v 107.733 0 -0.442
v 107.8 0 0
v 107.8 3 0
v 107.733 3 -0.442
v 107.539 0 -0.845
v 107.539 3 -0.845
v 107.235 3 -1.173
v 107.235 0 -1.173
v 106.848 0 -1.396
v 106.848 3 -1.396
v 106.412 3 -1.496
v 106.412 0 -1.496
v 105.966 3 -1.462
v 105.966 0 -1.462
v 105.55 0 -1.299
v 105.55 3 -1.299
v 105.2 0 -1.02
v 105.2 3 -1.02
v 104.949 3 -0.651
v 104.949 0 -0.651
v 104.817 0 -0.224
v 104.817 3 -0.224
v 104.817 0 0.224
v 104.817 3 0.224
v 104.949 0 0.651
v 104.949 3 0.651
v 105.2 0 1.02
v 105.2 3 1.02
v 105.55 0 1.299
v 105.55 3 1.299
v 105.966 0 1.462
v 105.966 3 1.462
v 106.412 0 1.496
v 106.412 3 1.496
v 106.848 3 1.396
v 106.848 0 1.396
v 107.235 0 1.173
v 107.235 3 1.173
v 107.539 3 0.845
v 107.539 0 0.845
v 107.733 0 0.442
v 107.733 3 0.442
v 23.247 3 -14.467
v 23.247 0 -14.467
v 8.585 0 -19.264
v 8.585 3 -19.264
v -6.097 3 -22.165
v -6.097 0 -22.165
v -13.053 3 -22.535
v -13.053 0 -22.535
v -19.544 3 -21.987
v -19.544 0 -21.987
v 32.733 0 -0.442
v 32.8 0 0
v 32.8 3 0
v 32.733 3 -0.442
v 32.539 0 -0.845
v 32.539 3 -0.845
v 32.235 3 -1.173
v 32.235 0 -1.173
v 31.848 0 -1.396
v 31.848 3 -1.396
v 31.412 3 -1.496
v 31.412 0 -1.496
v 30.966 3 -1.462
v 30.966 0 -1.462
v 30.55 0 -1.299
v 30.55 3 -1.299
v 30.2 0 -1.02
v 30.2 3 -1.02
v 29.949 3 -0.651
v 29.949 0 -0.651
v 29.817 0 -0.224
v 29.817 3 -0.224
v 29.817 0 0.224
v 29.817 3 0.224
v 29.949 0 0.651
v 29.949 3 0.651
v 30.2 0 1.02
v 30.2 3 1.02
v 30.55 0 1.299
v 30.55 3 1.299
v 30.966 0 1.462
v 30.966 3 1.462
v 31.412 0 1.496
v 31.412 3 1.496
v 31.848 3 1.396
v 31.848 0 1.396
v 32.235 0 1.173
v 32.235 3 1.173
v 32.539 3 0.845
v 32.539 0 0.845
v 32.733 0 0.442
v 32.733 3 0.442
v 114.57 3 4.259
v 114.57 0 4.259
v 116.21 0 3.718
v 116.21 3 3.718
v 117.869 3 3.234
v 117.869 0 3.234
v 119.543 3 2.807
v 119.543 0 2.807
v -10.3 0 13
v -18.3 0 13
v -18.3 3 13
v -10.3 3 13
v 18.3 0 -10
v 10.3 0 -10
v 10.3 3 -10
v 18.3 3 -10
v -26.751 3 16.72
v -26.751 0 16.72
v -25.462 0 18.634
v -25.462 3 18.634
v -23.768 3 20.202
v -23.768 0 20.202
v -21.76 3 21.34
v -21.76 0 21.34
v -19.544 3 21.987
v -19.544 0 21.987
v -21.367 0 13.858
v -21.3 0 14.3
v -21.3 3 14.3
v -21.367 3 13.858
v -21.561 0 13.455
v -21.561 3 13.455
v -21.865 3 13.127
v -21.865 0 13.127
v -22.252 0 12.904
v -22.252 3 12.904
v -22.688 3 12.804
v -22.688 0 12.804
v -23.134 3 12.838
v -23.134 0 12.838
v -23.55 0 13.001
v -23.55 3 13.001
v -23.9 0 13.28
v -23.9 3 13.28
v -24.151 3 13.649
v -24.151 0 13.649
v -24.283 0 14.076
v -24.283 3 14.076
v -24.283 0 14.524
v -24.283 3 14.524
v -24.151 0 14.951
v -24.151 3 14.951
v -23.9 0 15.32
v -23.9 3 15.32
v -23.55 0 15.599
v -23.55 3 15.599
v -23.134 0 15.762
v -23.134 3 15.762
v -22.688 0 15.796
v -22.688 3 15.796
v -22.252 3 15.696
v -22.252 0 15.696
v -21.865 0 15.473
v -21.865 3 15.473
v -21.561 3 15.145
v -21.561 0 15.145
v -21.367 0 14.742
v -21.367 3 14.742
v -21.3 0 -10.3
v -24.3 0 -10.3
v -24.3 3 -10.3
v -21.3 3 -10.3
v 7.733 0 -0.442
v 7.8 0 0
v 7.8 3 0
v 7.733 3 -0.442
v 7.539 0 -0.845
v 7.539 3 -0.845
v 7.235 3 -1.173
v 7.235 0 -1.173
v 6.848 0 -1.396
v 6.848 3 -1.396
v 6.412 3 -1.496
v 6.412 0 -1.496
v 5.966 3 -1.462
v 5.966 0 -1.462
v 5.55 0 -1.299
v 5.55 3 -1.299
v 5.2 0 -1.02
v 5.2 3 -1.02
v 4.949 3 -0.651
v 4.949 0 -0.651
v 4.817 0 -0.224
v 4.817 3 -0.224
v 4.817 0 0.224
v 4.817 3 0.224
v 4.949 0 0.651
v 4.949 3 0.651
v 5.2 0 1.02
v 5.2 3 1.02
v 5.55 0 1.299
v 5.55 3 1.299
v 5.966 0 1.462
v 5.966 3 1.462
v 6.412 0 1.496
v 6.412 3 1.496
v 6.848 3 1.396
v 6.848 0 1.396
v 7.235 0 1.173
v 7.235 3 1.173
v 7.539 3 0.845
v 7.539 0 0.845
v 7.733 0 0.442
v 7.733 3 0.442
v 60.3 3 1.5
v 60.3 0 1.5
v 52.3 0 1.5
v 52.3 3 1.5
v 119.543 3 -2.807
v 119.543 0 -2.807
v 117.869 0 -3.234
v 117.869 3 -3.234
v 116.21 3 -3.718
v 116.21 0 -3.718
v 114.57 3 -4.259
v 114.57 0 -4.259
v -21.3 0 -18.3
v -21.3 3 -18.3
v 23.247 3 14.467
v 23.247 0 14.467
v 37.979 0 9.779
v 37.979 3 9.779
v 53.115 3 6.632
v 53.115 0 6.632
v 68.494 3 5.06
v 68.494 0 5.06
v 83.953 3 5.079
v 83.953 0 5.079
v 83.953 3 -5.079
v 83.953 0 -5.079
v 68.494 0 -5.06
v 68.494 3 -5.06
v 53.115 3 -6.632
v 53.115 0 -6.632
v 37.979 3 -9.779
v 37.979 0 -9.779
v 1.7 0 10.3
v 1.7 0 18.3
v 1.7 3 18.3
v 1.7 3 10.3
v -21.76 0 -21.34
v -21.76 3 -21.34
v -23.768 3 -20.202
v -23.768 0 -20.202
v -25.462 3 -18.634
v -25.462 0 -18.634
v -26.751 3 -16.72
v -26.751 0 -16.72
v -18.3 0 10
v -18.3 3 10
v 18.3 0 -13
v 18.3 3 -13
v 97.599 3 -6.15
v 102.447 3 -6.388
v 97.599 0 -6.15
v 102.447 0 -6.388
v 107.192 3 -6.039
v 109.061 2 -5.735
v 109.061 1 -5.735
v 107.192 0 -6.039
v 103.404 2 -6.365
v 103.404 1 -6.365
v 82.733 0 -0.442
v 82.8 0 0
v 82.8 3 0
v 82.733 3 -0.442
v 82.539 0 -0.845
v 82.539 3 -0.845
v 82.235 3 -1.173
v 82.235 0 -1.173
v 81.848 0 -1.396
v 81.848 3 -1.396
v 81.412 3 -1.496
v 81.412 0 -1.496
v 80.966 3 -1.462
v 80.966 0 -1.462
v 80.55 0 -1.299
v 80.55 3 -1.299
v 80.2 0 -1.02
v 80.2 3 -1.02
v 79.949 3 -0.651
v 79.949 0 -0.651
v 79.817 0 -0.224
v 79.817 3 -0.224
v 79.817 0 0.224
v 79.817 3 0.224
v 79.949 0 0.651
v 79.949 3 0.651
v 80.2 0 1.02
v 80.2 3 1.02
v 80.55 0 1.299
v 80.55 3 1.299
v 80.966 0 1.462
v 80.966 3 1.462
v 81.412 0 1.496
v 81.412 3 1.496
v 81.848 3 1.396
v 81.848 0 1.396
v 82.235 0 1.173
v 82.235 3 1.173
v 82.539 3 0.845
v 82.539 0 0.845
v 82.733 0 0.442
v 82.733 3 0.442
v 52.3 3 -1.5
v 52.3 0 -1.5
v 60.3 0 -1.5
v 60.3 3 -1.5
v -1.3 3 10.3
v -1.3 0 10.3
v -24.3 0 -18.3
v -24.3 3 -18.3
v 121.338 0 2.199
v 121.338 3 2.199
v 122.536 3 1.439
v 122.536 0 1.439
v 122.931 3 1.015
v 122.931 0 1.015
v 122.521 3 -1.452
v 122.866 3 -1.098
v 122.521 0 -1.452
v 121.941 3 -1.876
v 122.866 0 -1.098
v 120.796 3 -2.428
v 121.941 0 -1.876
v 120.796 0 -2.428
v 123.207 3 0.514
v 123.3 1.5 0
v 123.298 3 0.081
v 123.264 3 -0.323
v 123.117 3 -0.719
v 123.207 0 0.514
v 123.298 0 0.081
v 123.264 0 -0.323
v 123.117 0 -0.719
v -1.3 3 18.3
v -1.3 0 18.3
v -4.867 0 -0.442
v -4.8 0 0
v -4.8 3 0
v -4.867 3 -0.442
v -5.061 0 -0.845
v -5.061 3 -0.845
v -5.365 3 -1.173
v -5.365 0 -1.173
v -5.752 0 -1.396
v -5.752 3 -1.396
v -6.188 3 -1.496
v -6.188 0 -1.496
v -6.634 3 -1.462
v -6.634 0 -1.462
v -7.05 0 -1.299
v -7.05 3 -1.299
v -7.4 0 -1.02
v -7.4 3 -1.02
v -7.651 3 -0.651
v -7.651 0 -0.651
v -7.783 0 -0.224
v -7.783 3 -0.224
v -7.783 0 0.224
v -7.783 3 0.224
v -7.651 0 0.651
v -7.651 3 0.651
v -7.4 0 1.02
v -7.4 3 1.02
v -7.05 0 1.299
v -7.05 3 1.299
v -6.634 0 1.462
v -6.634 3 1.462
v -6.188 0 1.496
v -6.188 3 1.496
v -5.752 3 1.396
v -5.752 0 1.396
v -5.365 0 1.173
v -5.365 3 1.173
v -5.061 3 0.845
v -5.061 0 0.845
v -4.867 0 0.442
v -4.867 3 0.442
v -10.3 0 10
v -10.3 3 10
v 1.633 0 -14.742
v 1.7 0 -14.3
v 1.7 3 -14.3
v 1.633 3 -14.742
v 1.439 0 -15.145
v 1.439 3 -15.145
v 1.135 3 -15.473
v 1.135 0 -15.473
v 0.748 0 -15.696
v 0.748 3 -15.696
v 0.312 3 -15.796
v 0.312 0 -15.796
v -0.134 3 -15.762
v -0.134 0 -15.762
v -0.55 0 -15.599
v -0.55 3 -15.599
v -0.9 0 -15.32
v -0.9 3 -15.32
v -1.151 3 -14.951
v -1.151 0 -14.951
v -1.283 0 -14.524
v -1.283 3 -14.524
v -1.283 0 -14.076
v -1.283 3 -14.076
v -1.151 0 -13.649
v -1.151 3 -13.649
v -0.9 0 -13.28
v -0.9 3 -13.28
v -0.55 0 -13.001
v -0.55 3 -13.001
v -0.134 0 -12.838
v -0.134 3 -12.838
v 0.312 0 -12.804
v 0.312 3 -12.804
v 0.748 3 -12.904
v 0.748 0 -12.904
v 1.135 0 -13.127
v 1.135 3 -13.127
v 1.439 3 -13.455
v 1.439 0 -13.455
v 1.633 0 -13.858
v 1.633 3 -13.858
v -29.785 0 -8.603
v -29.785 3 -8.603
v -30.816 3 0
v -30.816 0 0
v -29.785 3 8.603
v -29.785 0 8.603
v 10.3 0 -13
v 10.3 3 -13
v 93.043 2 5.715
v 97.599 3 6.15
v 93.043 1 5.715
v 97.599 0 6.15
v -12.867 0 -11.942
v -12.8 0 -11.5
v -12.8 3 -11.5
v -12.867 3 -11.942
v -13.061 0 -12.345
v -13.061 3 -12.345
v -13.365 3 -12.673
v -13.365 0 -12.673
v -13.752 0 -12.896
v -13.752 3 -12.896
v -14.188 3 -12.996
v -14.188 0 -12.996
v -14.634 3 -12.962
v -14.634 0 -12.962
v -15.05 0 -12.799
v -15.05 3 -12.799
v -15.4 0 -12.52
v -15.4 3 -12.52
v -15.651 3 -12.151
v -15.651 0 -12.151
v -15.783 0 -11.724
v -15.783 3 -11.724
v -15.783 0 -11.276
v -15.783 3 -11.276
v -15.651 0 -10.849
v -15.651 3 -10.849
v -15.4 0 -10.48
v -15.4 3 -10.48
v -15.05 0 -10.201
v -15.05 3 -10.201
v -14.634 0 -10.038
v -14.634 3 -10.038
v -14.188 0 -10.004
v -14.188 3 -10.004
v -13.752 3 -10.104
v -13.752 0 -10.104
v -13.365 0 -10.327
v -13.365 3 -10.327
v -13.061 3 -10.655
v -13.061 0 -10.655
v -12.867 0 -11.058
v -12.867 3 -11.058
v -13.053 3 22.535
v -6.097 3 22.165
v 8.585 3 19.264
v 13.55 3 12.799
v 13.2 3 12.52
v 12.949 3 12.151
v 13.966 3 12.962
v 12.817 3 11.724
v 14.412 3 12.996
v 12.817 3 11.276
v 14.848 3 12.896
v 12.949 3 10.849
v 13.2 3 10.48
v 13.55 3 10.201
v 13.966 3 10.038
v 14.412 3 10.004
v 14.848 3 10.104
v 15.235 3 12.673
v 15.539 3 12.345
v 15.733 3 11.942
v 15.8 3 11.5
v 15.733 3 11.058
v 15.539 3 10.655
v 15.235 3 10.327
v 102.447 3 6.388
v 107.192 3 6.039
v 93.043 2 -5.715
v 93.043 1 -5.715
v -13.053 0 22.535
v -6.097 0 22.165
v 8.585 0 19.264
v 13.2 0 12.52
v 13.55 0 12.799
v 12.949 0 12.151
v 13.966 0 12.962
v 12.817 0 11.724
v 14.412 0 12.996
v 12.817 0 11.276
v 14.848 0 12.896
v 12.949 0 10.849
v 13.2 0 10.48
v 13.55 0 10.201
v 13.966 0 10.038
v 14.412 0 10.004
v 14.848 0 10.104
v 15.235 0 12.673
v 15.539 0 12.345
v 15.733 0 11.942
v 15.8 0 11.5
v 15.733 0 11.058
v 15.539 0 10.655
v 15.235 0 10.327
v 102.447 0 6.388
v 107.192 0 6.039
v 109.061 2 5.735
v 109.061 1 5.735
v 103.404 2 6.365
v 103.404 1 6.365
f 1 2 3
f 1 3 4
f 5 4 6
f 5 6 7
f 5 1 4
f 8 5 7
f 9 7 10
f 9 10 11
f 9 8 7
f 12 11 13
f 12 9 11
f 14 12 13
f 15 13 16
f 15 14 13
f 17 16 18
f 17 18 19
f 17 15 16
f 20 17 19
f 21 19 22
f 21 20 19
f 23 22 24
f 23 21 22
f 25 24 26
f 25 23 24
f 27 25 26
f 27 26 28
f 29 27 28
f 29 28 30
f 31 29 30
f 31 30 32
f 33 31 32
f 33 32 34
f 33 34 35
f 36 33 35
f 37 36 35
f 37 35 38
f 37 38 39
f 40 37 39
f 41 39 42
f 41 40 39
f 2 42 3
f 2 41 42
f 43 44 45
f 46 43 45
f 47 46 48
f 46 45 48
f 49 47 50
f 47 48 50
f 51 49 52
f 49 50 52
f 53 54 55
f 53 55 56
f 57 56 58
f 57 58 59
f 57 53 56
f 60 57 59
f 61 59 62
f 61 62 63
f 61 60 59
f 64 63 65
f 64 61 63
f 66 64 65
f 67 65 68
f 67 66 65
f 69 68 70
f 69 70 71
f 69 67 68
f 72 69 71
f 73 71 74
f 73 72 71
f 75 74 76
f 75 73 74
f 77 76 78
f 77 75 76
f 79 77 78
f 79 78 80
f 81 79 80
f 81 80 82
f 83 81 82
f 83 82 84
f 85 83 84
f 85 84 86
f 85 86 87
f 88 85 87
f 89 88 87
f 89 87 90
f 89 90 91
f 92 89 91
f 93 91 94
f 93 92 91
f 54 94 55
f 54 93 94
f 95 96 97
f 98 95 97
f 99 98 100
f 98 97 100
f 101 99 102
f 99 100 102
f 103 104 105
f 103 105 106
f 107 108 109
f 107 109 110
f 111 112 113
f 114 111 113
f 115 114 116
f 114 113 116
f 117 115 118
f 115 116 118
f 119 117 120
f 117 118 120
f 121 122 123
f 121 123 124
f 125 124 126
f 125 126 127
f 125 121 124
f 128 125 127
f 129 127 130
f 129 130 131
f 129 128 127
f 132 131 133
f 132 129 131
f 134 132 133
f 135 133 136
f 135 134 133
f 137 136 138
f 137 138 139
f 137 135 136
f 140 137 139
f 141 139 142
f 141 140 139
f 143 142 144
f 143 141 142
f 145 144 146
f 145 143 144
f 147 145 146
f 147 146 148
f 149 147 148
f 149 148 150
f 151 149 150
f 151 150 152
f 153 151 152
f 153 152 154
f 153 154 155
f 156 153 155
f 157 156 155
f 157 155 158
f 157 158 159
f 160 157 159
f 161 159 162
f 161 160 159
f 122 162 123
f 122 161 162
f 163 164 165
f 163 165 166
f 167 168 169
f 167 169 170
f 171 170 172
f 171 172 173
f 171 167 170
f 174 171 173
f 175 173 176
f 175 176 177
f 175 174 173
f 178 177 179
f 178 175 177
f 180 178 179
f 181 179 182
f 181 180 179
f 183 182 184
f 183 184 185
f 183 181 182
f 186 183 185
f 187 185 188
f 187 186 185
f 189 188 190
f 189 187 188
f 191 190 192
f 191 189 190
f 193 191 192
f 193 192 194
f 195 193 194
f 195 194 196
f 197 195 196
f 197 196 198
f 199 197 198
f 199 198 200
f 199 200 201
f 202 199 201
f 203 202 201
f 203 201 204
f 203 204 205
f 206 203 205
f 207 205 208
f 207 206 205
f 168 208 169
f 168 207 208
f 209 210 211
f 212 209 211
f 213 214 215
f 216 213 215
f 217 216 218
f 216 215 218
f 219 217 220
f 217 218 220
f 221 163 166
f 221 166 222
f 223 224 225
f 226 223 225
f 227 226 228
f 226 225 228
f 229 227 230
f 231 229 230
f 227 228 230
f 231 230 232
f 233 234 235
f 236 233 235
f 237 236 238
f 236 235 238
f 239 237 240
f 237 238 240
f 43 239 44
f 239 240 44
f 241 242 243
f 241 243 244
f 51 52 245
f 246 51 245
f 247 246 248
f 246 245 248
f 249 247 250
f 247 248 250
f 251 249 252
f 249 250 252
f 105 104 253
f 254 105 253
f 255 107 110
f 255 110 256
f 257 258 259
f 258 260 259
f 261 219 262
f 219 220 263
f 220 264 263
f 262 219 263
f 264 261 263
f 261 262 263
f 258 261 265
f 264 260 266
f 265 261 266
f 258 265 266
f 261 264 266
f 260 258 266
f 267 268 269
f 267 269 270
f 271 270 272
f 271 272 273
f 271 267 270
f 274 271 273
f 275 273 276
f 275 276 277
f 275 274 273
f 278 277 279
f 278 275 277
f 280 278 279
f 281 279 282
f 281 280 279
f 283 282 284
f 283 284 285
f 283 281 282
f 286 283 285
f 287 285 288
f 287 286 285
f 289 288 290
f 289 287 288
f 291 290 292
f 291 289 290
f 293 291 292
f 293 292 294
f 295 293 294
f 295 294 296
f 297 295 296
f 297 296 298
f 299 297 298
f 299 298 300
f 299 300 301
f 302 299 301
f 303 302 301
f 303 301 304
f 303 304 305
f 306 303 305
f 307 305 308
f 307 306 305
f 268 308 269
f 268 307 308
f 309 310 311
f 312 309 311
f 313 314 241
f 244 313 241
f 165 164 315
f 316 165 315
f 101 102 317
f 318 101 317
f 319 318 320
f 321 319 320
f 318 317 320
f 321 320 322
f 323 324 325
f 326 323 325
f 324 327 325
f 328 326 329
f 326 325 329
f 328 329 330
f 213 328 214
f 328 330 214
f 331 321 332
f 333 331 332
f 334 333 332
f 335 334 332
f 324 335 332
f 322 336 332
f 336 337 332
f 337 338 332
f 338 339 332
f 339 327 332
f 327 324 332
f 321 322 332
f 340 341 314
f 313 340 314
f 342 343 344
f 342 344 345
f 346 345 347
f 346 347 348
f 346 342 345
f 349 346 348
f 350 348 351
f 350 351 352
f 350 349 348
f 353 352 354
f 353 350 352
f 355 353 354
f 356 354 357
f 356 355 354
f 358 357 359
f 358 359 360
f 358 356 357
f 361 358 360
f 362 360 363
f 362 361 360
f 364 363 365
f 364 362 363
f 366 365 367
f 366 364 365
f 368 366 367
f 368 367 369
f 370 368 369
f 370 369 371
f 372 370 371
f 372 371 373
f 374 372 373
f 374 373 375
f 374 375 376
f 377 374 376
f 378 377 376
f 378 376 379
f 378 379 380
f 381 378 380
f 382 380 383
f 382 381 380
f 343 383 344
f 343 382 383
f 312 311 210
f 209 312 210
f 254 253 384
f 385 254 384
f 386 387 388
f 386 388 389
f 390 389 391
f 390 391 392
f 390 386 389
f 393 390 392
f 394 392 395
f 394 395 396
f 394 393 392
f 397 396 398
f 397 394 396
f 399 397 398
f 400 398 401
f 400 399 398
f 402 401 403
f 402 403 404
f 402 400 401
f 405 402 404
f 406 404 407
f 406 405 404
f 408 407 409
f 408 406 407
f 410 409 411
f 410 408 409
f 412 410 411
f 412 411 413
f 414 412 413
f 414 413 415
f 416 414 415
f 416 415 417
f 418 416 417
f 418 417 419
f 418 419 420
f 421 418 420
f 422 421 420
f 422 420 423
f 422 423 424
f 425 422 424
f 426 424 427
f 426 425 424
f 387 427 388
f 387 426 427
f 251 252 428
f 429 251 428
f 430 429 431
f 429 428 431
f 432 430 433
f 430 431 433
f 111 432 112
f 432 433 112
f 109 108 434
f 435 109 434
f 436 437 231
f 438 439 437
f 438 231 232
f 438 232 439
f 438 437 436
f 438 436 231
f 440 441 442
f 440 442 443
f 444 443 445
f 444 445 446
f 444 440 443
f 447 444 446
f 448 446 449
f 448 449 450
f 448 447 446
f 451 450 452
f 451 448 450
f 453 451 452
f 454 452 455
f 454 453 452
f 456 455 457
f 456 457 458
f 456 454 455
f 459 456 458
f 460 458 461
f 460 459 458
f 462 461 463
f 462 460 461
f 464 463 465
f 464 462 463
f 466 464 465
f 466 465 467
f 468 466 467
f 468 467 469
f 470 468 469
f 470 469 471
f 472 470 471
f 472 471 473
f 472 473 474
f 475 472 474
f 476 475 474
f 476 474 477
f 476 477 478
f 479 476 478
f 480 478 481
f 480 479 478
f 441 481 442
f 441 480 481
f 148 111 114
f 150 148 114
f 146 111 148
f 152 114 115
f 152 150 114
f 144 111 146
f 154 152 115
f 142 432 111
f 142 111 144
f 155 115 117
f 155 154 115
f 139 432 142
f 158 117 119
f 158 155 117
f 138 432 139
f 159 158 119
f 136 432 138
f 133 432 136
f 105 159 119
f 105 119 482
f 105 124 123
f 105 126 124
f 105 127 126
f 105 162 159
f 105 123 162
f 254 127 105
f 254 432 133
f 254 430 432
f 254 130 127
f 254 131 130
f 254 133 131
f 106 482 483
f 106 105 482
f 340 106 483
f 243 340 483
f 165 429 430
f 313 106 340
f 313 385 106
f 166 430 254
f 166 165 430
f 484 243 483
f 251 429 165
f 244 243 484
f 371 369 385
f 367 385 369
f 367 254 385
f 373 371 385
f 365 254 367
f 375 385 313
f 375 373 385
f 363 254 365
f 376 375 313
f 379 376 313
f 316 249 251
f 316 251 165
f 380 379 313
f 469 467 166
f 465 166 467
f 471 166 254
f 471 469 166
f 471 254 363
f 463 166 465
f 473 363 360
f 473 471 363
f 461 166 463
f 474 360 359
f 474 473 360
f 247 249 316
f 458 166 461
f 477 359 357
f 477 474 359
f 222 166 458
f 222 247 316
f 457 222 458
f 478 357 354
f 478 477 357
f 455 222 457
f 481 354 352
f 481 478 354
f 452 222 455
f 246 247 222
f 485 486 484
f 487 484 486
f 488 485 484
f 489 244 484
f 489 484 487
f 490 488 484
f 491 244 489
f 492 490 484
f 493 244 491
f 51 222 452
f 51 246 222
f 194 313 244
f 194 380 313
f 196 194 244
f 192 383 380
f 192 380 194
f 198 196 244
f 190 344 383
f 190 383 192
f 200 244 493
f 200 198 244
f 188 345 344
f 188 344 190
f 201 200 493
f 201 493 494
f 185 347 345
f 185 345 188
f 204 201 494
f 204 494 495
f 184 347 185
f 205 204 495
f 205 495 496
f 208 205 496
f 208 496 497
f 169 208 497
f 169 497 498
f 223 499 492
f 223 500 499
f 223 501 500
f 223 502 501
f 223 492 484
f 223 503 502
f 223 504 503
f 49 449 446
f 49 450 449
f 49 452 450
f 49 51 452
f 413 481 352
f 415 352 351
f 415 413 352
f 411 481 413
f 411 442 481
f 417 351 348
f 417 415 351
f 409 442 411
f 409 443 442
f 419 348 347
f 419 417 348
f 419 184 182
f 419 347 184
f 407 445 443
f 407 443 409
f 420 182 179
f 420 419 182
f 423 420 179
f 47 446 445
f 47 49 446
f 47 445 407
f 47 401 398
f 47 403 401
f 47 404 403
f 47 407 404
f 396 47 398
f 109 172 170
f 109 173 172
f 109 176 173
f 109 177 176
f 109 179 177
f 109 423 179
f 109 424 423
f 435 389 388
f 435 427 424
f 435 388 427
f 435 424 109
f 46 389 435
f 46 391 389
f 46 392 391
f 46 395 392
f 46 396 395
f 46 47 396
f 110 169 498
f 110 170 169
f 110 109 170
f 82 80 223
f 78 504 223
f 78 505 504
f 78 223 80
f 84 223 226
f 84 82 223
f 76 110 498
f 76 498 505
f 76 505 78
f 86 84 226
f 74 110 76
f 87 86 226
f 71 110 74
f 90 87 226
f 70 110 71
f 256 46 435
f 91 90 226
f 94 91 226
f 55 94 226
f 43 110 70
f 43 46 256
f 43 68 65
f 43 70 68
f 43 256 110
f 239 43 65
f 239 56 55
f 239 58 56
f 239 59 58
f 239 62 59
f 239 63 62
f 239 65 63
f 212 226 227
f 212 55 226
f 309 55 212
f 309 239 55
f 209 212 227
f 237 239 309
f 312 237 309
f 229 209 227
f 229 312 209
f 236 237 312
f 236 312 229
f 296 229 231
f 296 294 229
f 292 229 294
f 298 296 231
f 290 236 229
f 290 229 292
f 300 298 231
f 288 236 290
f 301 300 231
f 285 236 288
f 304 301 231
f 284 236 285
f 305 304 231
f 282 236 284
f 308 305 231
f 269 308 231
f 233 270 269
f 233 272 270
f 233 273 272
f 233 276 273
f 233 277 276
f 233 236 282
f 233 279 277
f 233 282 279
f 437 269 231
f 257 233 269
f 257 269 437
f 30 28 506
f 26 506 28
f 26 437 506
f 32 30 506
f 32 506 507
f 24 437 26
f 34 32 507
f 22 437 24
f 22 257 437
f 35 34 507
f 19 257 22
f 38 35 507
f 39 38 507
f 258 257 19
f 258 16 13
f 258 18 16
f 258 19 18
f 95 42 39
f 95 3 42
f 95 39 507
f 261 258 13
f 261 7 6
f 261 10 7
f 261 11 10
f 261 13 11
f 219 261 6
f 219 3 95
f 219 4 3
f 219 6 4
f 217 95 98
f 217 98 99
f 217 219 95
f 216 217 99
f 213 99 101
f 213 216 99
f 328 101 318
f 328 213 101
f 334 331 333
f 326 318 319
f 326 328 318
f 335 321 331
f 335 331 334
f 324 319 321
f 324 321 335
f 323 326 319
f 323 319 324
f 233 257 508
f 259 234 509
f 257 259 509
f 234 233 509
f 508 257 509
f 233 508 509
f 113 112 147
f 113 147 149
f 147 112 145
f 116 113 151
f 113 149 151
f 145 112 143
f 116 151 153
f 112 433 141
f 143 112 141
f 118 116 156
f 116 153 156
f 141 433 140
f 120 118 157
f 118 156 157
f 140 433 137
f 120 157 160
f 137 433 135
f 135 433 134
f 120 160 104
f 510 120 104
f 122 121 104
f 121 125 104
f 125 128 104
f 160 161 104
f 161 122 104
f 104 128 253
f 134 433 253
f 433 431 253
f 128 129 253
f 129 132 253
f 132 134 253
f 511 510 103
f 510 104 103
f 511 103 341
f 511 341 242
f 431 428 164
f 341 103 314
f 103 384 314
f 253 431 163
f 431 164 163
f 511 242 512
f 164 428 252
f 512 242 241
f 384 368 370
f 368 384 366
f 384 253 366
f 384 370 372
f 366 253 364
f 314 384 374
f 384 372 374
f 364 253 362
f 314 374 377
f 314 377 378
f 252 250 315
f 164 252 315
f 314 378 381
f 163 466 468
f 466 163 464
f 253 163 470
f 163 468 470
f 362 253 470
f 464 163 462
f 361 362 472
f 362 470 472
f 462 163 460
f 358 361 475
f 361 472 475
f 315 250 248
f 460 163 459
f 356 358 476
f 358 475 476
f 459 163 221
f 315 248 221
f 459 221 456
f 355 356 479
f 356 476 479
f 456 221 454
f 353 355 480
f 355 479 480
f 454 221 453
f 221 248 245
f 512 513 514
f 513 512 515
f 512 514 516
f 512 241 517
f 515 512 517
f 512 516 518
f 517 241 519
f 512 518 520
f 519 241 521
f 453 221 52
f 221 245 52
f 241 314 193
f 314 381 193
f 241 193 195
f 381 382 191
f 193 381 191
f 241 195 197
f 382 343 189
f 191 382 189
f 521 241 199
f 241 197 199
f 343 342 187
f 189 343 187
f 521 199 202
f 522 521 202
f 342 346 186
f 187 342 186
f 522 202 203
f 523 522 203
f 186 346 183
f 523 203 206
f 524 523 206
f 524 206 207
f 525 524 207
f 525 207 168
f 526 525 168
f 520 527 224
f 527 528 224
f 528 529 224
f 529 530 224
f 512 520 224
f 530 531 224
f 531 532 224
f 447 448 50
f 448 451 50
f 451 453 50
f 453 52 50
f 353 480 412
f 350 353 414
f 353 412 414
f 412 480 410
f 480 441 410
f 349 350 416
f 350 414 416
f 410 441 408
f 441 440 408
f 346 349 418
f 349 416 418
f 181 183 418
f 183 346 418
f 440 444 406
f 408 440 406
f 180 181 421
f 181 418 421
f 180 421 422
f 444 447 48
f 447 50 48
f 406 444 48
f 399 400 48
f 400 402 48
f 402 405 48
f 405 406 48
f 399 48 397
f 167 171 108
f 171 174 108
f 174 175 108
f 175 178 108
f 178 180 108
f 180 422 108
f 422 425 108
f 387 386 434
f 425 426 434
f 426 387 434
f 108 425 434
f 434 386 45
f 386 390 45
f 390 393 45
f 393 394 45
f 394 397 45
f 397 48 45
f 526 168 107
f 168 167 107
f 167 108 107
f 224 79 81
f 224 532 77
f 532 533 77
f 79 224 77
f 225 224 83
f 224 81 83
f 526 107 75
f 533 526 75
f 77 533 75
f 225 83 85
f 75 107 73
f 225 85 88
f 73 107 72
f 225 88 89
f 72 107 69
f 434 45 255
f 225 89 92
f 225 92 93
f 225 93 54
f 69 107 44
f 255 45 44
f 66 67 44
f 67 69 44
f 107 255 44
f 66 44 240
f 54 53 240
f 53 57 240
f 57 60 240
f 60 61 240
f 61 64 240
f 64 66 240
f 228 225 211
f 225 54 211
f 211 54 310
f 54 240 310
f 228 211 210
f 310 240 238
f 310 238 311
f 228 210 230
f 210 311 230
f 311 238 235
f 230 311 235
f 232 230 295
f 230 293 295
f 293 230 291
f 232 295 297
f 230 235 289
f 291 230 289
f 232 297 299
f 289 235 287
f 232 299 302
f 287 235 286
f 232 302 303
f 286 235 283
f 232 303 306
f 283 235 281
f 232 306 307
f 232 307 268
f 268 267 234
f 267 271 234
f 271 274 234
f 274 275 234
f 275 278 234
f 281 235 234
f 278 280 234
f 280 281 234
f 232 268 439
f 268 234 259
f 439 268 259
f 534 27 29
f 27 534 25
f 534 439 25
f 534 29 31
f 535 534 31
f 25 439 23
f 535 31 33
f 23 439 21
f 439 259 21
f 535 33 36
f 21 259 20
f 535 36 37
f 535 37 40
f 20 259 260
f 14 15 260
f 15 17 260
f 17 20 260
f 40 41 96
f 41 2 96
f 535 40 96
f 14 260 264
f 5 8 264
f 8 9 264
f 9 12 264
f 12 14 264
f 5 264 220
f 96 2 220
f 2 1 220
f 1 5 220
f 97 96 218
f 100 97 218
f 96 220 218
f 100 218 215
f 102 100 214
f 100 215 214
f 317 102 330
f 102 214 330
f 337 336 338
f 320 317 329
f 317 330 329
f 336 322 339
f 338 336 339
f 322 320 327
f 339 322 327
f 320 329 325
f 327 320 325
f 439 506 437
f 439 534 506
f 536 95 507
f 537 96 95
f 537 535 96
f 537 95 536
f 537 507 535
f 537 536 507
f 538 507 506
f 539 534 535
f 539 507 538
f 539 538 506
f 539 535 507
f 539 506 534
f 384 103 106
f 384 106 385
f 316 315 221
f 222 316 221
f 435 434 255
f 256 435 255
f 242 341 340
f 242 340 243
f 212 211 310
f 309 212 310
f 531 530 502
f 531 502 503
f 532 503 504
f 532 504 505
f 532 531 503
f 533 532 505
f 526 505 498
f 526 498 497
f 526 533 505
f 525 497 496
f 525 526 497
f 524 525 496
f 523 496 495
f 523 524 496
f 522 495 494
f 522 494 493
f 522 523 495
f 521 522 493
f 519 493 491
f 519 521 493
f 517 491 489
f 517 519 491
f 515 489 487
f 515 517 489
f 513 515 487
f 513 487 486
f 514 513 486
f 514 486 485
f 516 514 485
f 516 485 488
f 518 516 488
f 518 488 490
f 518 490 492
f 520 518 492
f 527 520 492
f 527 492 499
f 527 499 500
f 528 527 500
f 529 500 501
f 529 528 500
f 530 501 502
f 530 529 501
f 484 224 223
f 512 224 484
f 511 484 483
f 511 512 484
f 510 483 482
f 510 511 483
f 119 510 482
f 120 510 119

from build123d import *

# Parameters (mm, degrees)
ESBO_O1_R                = 1.5
ESBO_O1_W                = 3
ESBO_O1_H                = 8
ESBO_O1_W_2              = 8
ESBO_O1_H_2              = 3
RESSALTO_EXTRUS_O1_DEPTH = 3


with BuildPart() as part:
    # Esboço1 → Ressalto-extrusão1 (new body)
    with BuildSketch(Plane(origin=(0, 0, 0), x_dir=(1, 0, 0), z_dir=(0, 1, 0))):
        with BuildLine():
            ThreePointArc((-19.544028008, 21.987058404), (-23.767751262, 20.202130438), (-26.75078073, 16.719697214))
            ThreePointArc((-26.75078073, 16.719697214), (-30.815641586, -2.3e-07), (-26.750780519, -16.719697622))
            ThreePointArc((-26.750780519, -16.719697622), (-23.767751269, -20.202130616), (-19.544028371, -21.987058612))
            add(Edge.make_bspline(
                [(23.247280819, -14.466941833), (22.21541658, -14.85491506), (7.843575487, -20.128766531), (-8.032505645, -23.945383183), (-19.544028371, -21.987058612)],
                knots=[0.1894974, 0.1894974, 0.1894974, 0.1894974, 0.216439611, 0.561126756, 0.561126756, 0.561126756, 0.561126756], degree=3))
            ThreePointArc((23.247280819, -14.466941833), (53.114593998, -6.632399806), (83.953283265, -5.079438247))
            add(Edge.make_bspline(
                [(97.598521861, -6.15), (93.039003458, -5.676054912), (88.490590593, -5.319200994), (83.953283265, -5.079438247)],
                knots=[0, 0, 0, 0, 0.137959586, 0.137959586, 0.137959586, 0.137959586], degree=3))
            add(Edge.make_bspline(
                [(114.569723425, -4.259468977), (109.134912936, -6.157348784), (103.477845748, -6.787525792), (97.598521861, -6.15)],
                knots=[0.35388944, 0.35388944, 0.35388944, 0.35388944, 1, 1, 1, 1], degree=3))
            ThreePointArc((114.569723425, -4.259468977), (117.037611185, -3.468795912), (119.543150354, -2.807050219))
            add(Edge.make_bspline(
                [(119.543150354, -2.807050219), (131.408766059, 0), (119.543150354, 2.807050219)],
                knots=[5.194112445, 5.194112445, 5.194112445, 7.372258169, 7.372258169, 7.372258169], degree=2, weights=[1, 0.463307193, 1]))
            ThreePointArc((119.543150354, 2.807050219), (117.037611185, 3.468795912), (114.569723425, 4.259468977))
            add(Edge.make_bspline(
                [(114.569723425, 4.259468977), (109.134912936, 6.157348784), (103.477845748, 6.787525792), (97.598521861, 6.15)],
                knots=[0.35388944, 0.35388944, 0.35388944, 0.35388944, 1, 1, 1, 1], degree=3))
            add(Edge.make_bspline(
                [(97.598521861, 6.15), (93.039003574, 5.676054924), (88.490590825, 5.319201013), (83.953283612, 5.079438265)],
                knots=[0, 0, 0, 0, 0.137959582, 0.137959582, 0.137959582, 0.137959582], degree=3))
            ThreePointArc((83.953283612, 5.079438265), (53.114594943, 6.632399691), (23.24728229, 14.466941345))
            add(Edge.make_bspline(
                [(23.24728229, 14.466941345), (22.21541757, 14.854914742), (7.843576153, 20.128766099), (-8.032505406, 23.945382333), (-19.544028008, 21.987058404)],
                knots=[0.189497388, 0.189497388, 0.189497388, 0.189497388, 0.216439611, 0.561126752, 0.561126752, 0.561126752, 0.561126752], degree=3))
        make_face()
        with Locations((-22.8, -14.3)):
            Circle(ESBO_O1_R, mode=Mode.SUBTRACT)
        with Locations((0.2, -14.3)):
            Rectangle(ESBO_O1_W, ESBO_O1_H, mode=Mode.SUBTRACT)
        with Locations((-14.3, -11.5)):
            Rectangle(ESBO_O1_W_2, ESBO_O1_H_2, mode=Mode.SUBTRACT)
        with Locations((14.3, -11.5)):
            Circle(ESBO_O1_R, mode=Mode.SUBTRACT)
        with Locations((-6.3, 0)):
            Circle(ESBO_O1_R, mode=Mode.SUBTRACT)
        with Locations((6.3, 0)):
            Circle(ESBO_O1_R, mode=Mode.SUBTRACT)
        with Locations((-14.3, 11.5)):
            Circle(ESBO_O1_R, mode=Mode.SUBTRACT)
        with Locations((31.3, 0)):
            Circle(ESBO_O1_R, mode=Mode.SUBTRACT)
        with Locations((14.3, 11.500000009)):
            Rectangle(ESBO_O1_W_2, ESBO_O1_H_2, mode=Mode.SUBTRACT)
        with Locations((-22.8, 14.3)):
            Rectangle(ESBO_O1_W, ESBO_O1_H, mode=Mode.SUBTRACT)
        with Locations((0.2, 14.3)):
            Circle(ESBO_O1_R, mode=Mode.SUBTRACT)
        Polygon((60.3, -1.5), (56.3, -1.5), (52.3, -1.5), (52.3, 1.5), (60.3, 1.5), align=None, mode=Mode.SUBTRACT)
        with Locations((81.3, 0)):
            Circle(ESBO_O1_R, mode=Mode.SUBTRACT)
        with Locations((106.3, 0)):
            Circle(ESBO_O1_R, mode=Mode.SUBTRACT)
    extrude(amount=RESSALTO_EXTRUS_O1_DEPTH)


solid = part.part
